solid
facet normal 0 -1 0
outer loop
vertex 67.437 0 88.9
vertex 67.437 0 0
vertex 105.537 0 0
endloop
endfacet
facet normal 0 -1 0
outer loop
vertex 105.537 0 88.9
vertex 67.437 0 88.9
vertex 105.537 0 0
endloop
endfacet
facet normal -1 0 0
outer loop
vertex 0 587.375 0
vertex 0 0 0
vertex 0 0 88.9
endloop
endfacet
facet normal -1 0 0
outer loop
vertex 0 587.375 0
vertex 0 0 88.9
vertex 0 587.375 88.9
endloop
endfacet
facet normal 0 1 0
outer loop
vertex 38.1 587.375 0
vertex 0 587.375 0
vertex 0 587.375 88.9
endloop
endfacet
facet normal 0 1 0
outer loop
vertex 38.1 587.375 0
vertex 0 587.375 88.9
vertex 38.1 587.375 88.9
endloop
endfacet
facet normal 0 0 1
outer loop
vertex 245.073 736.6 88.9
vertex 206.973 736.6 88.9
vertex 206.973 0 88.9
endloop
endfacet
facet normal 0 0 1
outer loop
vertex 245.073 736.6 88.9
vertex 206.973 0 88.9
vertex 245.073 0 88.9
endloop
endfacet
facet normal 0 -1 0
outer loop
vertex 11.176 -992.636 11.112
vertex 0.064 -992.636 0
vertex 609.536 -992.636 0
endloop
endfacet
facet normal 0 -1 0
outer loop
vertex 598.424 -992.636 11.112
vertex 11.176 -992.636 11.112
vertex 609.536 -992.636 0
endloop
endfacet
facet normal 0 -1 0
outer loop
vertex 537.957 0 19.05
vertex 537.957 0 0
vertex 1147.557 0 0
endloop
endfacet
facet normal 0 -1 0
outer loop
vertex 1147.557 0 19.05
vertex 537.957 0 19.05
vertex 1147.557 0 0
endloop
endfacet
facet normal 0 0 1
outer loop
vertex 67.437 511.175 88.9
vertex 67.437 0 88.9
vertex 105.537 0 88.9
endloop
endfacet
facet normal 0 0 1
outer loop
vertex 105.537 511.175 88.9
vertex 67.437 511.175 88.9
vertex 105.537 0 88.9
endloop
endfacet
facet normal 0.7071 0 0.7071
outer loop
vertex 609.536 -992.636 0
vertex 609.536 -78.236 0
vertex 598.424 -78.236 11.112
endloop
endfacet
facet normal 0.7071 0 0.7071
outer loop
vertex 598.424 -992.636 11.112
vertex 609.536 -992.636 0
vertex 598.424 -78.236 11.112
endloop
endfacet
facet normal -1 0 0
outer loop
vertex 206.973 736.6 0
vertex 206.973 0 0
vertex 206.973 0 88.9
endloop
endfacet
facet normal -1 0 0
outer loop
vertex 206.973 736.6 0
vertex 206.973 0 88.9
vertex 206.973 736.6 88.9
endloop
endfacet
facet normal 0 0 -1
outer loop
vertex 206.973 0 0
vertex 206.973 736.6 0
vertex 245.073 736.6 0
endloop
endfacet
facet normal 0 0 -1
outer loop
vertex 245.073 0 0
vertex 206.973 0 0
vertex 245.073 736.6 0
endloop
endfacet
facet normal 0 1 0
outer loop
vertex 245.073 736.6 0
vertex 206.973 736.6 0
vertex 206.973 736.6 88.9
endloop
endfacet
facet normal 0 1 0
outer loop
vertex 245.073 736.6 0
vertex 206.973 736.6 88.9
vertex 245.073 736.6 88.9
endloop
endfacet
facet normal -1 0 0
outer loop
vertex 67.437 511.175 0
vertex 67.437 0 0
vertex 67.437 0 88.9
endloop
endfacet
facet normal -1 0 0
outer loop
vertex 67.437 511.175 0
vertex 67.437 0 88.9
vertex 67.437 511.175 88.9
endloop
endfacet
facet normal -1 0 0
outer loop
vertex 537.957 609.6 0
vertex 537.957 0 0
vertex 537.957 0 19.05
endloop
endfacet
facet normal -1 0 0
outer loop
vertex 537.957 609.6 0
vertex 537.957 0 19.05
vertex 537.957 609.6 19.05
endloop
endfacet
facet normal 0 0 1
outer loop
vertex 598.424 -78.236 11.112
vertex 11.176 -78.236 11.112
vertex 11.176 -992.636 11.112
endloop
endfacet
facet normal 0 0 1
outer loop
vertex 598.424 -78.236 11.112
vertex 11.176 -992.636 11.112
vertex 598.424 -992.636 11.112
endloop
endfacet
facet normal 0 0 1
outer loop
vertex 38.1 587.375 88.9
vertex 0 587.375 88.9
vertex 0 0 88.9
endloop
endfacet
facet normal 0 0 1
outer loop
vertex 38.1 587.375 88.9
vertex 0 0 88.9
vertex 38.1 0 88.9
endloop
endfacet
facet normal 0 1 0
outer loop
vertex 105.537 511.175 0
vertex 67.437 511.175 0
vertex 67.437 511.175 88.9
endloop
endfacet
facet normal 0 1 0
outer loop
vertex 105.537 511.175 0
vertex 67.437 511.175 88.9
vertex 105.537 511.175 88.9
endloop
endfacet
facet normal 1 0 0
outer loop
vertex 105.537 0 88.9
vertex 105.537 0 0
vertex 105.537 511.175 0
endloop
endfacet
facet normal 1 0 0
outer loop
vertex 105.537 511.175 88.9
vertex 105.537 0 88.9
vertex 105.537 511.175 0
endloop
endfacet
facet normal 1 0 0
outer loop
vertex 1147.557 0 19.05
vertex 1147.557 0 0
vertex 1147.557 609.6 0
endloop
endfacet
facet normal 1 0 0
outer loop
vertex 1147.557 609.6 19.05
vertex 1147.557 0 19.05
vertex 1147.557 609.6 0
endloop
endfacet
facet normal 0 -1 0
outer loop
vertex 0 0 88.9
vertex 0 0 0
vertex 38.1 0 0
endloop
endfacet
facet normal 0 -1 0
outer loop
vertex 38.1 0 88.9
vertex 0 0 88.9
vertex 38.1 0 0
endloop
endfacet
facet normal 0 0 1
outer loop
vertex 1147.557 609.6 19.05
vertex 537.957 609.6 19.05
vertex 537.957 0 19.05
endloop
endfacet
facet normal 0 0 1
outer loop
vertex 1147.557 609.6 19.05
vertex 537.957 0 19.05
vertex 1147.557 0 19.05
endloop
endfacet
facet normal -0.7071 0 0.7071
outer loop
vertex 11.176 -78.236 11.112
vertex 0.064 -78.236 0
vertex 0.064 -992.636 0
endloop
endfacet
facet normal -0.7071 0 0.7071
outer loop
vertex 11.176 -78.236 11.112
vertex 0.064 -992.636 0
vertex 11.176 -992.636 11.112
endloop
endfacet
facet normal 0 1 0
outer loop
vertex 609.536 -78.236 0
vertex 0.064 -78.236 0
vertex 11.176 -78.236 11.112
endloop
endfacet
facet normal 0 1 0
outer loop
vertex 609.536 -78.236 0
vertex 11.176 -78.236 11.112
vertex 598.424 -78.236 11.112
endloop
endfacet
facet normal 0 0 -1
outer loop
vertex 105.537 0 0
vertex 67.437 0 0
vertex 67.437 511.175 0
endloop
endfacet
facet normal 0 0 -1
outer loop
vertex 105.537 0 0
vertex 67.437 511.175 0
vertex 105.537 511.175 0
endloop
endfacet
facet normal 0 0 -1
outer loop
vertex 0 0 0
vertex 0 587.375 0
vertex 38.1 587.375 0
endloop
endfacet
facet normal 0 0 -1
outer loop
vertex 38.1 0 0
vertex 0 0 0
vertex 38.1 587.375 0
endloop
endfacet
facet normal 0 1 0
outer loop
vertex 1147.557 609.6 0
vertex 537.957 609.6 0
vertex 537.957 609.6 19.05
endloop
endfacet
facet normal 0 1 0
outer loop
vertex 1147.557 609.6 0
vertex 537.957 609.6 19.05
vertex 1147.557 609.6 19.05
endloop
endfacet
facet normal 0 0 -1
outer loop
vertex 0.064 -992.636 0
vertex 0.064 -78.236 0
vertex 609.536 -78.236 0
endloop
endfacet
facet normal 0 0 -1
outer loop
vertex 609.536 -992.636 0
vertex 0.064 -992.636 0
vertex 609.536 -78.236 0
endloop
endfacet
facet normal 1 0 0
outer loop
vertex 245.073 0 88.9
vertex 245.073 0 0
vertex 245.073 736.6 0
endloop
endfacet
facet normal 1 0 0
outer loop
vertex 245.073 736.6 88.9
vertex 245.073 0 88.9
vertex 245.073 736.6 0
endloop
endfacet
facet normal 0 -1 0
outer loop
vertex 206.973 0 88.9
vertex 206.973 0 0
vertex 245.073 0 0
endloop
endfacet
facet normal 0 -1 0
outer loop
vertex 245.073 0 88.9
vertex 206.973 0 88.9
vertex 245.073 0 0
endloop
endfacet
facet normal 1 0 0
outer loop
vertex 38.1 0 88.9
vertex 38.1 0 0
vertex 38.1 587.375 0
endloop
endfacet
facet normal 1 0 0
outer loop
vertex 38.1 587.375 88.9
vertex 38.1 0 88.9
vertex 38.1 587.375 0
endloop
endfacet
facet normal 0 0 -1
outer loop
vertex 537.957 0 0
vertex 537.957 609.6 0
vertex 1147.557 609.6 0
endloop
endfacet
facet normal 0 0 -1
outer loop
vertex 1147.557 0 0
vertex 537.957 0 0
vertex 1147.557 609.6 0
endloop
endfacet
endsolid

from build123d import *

# Parameters (mm, degrees)
F0_W         = 38.1
F0_H         = 587.375
F1_DEPTH     = 88.9
F2_W         = 38.1
F2_H         = 736.6
F3_DEPTH     = 88.9
F4_W         = 38.1
F4_H         = 511.175
F5_DEPTH     = 88.9
F6_W         = 609.6
F6_H         = 609.6
F7_DEPTH     = 19.05
F8_W         = 609.6
F8_H         = 914.4
F9_DEPTH     = 11.1125
F10_T1_DEPTH = 971.882258147


# Not quite as in the source:
# - a fillet or chamfer that OpenCascade refuses, or shapes differently, is made with other operations: its cross-section is extruded or revolved along the edge and cut away or added
# - a length typed as a fraction of an inch, garbled in the dataset ("3 / 203.2 mm" for 3/8 in), is restored


with BuildPart() as f1:
    # F0 (on Top) → F1 (new body)
    with BuildSketch(Plane.XY):
        with Locations((19.05, 293.6875)):
            Rectangle(F0_W, F0_H)
    extrude(amount=F1_DEPTH)


with BuildPart() as f3:
    # F2 (on Top) → F3 (new body)
    with BuildSketch(Plane.XY):
        with Locations((226.0228706253, 368.3)):
            Rectangle(F2_W, F2_H)
    extrude(amount=F3_DEPTH)


with BuildPart() as f5:
    # F4 (on Top) → F5 (new body)
    with BuildSketch(Plane.XY):
        with Locations((86.4868082545, 255.5875)):
            Rectangle(F4_W, F4_H)
    extrude(amount=F5_DEPTH)


with BuildPart() as f7:
    # F6 (on Top) → F7 (new body)
    with BuildSketch(Plane.XY):
        with Locations((842.7567224306, 304.8)):
            Rectangle(F6_W, F6_H)
    extrude(amount=F7_DEPTH)


with BuildPart() as f9:
    # F8 (on Top) → F9 (new body)
    with BuildSketch(Plane.XY):
        with Locations((304.8, -535.4357879985)):
            Rectangle(F8_W, F8_H)
    extrude(amount=F9_DEPTH)

    # F10: chamfer of 11.176 on 2 edges, made by hand

    # F10_s2 → F10_t1 (cut)
    with BuildSketch(Plane.XZ.offset(49.494658925)):
        Polygon((609.6, -0.0635), (598.424, 11.1125), (609.6, 11.1125), align=None)
        Polygon((0, -0.0635), (11.176, 11.1125), (0, 11.1125), align=None)
    extrude(amount=F10_T1_DEPTH, mode=Mode.SUBTRACT)


solid = Compound([f1.part, f3.part, f5.part, f7.part, f9.part])
